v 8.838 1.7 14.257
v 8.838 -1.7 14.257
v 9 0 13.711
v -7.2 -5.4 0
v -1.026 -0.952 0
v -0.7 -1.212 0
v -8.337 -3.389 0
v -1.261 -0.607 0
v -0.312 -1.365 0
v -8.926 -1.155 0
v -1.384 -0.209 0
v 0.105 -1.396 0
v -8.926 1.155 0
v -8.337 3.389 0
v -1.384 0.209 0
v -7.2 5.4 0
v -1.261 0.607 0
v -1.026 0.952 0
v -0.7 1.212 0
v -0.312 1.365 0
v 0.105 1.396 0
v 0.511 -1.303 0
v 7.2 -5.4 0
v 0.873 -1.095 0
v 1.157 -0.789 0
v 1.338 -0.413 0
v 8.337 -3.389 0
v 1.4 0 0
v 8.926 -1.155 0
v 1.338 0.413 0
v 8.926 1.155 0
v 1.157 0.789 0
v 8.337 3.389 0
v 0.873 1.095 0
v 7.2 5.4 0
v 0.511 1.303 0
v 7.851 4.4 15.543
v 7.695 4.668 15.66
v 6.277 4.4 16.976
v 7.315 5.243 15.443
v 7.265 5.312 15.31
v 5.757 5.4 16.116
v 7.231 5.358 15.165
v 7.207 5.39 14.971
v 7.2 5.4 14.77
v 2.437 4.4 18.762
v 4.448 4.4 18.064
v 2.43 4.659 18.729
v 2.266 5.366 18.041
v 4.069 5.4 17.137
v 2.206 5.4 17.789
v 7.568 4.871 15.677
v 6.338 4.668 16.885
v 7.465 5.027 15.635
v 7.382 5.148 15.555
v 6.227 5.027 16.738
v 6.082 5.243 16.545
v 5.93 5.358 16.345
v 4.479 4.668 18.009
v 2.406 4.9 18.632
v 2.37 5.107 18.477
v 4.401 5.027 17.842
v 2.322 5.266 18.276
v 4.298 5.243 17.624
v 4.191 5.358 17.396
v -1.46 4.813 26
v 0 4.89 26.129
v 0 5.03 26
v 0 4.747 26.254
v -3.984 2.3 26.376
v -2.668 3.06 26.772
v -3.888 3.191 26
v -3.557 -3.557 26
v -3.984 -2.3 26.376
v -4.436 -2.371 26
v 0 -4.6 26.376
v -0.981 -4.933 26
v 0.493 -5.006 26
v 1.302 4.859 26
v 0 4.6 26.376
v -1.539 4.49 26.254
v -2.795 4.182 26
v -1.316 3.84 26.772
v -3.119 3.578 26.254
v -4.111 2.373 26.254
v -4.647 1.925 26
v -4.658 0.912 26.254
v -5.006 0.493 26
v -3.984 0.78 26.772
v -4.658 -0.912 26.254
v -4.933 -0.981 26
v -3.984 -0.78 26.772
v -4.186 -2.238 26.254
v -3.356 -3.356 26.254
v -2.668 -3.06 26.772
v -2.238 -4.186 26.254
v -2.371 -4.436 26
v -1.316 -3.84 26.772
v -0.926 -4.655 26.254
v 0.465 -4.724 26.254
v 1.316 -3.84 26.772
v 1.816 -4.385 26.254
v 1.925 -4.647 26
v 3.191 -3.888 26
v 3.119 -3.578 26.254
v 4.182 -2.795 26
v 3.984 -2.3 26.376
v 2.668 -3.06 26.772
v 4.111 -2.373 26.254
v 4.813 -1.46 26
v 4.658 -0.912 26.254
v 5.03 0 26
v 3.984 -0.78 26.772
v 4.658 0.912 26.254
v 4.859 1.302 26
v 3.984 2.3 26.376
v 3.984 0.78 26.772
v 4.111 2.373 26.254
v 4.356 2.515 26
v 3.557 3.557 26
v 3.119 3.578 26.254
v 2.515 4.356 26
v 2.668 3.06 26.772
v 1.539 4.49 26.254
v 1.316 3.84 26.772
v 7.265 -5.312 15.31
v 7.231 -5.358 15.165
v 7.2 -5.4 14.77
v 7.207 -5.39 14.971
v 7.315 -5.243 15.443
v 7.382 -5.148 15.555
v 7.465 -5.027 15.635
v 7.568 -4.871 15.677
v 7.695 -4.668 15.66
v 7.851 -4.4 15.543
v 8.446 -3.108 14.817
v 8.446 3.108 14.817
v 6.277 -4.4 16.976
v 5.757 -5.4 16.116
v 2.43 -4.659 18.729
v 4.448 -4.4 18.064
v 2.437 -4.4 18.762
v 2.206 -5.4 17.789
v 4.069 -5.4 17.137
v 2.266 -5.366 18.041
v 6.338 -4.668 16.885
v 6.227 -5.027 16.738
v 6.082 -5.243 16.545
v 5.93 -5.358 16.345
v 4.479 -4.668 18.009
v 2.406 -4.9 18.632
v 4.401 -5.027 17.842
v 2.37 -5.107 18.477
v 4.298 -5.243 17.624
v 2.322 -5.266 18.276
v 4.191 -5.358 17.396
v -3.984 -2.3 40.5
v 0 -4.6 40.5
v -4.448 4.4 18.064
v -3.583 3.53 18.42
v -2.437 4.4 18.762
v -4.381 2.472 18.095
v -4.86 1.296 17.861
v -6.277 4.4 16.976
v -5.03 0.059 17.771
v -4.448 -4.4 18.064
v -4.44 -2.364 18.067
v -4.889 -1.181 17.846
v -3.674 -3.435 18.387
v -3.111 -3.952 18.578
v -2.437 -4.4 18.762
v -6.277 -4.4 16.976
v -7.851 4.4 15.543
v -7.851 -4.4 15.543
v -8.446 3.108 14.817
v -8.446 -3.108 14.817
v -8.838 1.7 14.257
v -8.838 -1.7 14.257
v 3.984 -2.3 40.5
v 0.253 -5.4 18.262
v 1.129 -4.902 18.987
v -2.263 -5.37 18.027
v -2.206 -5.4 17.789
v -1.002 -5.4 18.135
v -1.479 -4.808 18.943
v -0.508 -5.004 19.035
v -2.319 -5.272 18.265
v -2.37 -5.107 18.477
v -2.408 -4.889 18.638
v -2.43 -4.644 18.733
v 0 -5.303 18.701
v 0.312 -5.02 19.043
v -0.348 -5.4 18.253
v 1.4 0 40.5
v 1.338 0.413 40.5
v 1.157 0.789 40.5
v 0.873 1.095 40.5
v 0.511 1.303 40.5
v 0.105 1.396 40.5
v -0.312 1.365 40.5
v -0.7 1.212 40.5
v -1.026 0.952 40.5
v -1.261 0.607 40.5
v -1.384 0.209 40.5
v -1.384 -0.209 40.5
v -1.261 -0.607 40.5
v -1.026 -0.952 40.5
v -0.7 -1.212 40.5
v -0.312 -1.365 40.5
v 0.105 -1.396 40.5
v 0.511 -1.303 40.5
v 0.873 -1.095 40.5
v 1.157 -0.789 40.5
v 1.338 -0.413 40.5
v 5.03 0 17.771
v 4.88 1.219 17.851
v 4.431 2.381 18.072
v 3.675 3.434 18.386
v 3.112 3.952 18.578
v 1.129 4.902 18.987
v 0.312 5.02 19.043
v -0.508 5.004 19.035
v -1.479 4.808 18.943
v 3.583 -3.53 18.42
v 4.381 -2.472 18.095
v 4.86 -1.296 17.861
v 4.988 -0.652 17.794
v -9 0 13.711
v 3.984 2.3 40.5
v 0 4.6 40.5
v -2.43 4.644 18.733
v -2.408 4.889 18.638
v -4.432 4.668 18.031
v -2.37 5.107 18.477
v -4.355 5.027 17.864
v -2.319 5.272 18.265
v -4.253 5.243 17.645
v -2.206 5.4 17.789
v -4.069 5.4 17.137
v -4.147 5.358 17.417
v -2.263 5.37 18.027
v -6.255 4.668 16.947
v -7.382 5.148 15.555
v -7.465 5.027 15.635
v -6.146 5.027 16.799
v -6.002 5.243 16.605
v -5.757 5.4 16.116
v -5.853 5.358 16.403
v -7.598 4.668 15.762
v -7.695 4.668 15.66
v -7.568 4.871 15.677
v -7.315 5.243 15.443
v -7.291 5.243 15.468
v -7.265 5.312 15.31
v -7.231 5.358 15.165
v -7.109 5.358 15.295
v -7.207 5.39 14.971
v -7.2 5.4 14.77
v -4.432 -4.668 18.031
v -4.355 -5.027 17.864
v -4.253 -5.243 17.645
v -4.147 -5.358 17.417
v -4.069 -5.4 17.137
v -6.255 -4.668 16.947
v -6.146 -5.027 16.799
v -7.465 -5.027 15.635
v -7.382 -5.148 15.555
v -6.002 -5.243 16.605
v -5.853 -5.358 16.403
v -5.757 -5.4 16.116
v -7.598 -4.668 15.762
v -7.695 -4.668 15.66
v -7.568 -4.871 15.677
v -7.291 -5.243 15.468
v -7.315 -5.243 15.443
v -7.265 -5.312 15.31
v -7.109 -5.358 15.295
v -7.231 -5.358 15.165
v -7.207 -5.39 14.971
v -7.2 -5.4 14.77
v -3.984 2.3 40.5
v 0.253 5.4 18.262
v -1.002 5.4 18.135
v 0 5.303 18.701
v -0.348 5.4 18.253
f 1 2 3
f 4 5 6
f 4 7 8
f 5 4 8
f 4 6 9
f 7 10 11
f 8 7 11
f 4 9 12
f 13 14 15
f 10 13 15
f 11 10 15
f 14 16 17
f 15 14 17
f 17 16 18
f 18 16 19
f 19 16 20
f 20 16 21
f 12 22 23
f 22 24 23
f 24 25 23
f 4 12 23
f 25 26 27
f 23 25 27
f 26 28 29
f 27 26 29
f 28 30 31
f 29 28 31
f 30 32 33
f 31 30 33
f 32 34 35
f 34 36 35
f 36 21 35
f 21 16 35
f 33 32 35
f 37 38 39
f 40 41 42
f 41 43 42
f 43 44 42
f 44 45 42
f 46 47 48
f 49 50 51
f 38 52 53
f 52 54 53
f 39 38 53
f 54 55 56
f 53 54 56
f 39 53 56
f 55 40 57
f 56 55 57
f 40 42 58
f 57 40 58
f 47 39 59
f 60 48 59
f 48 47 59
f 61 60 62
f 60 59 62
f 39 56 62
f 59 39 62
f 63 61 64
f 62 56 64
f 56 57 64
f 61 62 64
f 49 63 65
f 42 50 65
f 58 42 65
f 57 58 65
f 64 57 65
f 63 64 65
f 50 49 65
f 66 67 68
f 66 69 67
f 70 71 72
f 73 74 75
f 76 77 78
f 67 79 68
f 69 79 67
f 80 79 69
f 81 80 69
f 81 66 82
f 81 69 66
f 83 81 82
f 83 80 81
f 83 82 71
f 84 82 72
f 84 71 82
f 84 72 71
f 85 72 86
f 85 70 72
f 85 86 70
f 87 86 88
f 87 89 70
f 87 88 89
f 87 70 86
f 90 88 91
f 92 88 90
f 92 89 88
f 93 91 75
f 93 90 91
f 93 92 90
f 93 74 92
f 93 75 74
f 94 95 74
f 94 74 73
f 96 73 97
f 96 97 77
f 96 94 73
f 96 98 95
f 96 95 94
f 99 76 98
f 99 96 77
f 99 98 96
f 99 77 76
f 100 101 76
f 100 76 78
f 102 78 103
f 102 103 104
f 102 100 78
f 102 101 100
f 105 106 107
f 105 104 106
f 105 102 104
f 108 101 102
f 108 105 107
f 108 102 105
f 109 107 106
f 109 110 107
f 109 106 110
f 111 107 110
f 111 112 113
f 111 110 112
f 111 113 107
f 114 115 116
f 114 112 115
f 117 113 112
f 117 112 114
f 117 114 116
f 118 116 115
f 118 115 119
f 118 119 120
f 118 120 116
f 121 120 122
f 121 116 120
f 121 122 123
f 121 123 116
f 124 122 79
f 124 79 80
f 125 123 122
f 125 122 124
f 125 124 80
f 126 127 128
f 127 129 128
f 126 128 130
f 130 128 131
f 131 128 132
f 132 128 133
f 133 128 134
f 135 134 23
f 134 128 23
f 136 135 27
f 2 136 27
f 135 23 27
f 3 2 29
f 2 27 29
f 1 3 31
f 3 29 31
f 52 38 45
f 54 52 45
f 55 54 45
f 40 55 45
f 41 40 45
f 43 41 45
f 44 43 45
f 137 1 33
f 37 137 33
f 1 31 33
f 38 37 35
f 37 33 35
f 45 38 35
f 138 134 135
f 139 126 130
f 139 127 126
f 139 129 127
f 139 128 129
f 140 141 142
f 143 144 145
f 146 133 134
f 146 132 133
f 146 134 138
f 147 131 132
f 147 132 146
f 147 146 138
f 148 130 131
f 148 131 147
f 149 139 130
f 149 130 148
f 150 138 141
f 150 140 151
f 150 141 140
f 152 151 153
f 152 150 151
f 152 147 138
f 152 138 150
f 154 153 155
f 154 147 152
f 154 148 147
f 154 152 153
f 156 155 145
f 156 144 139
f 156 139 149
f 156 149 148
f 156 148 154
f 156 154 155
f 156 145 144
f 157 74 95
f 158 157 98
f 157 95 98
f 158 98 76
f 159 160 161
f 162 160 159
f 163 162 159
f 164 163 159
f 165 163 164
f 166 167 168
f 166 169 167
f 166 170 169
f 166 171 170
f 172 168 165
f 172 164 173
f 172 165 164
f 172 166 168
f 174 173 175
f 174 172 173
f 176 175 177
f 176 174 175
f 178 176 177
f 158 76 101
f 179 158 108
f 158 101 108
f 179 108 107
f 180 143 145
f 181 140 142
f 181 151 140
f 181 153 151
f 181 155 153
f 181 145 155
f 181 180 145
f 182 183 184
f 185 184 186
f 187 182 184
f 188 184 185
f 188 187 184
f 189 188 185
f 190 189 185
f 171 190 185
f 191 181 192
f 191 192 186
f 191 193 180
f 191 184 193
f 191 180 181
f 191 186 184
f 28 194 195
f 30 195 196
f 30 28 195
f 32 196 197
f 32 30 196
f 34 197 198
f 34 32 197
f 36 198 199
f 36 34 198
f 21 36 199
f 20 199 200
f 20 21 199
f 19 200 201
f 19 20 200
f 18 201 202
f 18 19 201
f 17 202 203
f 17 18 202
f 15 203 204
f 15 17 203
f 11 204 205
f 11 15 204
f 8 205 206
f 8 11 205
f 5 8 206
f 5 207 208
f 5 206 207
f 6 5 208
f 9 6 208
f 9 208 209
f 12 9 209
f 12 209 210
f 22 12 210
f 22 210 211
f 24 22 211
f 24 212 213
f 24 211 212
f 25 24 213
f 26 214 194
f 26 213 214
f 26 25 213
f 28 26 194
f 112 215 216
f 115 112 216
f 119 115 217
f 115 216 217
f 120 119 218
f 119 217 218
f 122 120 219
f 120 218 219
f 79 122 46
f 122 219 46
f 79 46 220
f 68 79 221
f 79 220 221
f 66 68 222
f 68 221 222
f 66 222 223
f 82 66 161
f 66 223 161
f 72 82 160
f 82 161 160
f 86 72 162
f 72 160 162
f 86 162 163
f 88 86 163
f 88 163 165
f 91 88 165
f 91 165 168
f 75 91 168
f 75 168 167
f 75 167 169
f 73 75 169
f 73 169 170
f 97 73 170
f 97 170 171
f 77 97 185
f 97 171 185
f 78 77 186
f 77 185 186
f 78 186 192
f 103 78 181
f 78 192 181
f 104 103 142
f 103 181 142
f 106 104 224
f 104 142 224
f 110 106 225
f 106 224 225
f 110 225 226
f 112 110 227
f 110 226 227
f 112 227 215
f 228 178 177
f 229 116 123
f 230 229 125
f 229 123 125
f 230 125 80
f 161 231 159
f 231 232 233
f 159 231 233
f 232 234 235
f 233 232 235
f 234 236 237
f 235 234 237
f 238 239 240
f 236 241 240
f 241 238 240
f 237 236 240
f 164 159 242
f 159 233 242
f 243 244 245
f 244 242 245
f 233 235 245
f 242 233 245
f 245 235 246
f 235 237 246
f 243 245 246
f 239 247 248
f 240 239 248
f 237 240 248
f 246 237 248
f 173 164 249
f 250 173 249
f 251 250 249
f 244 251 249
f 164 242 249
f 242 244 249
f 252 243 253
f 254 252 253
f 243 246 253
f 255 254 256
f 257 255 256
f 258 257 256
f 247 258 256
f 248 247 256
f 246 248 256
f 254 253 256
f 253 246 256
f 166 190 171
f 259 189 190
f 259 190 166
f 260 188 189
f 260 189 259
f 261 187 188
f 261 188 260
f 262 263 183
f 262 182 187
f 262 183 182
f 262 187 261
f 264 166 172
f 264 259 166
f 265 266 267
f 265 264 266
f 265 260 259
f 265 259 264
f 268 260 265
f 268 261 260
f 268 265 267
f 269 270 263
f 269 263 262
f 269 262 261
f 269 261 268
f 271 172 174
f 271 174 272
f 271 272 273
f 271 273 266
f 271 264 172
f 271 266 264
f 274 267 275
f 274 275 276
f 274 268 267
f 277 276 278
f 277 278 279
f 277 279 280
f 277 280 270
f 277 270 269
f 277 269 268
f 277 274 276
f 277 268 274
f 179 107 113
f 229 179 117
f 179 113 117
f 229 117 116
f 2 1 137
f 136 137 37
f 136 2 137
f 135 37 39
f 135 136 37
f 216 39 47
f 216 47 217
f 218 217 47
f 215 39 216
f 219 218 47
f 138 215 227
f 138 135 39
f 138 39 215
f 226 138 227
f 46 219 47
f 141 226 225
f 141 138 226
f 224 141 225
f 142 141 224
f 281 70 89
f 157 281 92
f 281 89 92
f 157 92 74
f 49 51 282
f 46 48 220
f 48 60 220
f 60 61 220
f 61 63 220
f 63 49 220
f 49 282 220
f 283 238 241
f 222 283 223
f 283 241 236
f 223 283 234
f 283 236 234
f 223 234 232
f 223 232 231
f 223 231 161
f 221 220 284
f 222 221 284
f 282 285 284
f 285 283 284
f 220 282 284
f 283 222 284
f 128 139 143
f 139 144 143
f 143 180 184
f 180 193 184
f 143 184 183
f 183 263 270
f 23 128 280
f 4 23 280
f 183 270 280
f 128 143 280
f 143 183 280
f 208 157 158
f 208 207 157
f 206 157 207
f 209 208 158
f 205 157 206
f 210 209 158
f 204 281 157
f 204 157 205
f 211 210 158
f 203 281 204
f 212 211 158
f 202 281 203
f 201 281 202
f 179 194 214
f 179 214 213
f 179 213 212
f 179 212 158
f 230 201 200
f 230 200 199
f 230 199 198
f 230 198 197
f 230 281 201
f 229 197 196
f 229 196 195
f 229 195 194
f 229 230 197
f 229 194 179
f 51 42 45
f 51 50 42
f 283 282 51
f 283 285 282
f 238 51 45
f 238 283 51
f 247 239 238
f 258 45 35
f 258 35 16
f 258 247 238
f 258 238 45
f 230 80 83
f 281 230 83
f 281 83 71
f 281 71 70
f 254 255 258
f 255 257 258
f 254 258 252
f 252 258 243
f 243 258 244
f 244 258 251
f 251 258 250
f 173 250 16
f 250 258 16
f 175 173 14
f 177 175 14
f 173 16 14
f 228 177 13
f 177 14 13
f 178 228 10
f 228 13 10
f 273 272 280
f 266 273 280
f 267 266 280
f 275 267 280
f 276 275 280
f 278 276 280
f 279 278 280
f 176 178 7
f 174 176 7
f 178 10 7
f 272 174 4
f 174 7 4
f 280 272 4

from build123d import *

# Parameters (mm, degrees)
PAD009_DEPTH         = 5.4
SKETCH014_R          = 5.03
PAD010_DEPTH         = 26
PAD011_DEPTH         = 40.5
SKETCH018_R          = 1.4
POCKET005_DEPTH      = 0.001
POCKET005_DEPTH_BACK = 40.501
FILLET003_R          = 1
SKETCH031_R          = 14.133118
SKETCH031_R_2        = 9
POCKET010_DEPTH      = 40.501


with BuildPart() as part:
    # Sketch013 → Pad009 (new body, symmetric)
    with BuildSketch(Plane.XZ):
        with BuildLine():
            Line((9, 14), (9, 0))
            Line((-9, 0), (9, 0))
            Line((-9, 0), (-9, 14))
            ThreePointArc((9, 14), (0, 19.047512), (-9, 14))
        make_face()
    extrude(amount=PAD009_DEPTH, both=True)

    # Sketch014 → Pad010 (join)
    with BuildSketch(Plane.XY):
        Circle(SKETCH014_R)
    extrude(amount=PAD010_DEPTH)

    # Sketch015 → Pad011 (join)
    with BuildSketch(Plane.XY):
        Polygon((0, 4.6), (-3.983717, 2.3), (-3.983717, -2.3), (0, -4.6), (3.983717, -2.3), (3.983717, 2.3), align=None)
    extrude(amount=PAD011_DEPTH)

    # Sketch017 → Revolution002 (revolve)
    with BuildSketch(Plane.YZ):
        with BuildLine():
            Line((0, 26), (5.03, 26))
            ThreePointArc((5.03, 26), (2.706515, 27.481661), (0, 28))
            Line((0, 26), (0, 28))
        make_face()
    revolve(axis=Axis((0, 0, 0), (0, 0, 1)))

    # Sketch018 → Pocket005 (cut, two sides)
    with BuildSketch(Plane.XY) as pocket005_sk:
        Circle(SKETCH018_R)
    extrude(amount=-POCKET005_DEPTH, mode=Mode.SUBTRACT)
    extrude(pocket005_sk.sketch, amount=POCKET005_DEPTH_BACK, mode=Mode.SUBTRACT)

    # Fillet003
    fillet003_edges = [part.edges().sort_by_distance(p)[0] for p in [
        (0, 5.4, 19.047512),
        (0, -5.4, 19.047512),
        (-9, 0, 14),
        (9, 0, 14),
    ]]
    fillet(fillet003_edges, radius=FILLET003_R)

    # Sketch031 → Pocket010 (cut, through all)
    with BuildSketch(Plane.XY):
        Circle(SKETCH031_R)
        Circle(SKETCH031_R_2, mode=Mode.SUBTRACT)
    extrude(amount=POCKET010_DEPTH, mode=Mode.SUBTRACT)


solid = part.part
